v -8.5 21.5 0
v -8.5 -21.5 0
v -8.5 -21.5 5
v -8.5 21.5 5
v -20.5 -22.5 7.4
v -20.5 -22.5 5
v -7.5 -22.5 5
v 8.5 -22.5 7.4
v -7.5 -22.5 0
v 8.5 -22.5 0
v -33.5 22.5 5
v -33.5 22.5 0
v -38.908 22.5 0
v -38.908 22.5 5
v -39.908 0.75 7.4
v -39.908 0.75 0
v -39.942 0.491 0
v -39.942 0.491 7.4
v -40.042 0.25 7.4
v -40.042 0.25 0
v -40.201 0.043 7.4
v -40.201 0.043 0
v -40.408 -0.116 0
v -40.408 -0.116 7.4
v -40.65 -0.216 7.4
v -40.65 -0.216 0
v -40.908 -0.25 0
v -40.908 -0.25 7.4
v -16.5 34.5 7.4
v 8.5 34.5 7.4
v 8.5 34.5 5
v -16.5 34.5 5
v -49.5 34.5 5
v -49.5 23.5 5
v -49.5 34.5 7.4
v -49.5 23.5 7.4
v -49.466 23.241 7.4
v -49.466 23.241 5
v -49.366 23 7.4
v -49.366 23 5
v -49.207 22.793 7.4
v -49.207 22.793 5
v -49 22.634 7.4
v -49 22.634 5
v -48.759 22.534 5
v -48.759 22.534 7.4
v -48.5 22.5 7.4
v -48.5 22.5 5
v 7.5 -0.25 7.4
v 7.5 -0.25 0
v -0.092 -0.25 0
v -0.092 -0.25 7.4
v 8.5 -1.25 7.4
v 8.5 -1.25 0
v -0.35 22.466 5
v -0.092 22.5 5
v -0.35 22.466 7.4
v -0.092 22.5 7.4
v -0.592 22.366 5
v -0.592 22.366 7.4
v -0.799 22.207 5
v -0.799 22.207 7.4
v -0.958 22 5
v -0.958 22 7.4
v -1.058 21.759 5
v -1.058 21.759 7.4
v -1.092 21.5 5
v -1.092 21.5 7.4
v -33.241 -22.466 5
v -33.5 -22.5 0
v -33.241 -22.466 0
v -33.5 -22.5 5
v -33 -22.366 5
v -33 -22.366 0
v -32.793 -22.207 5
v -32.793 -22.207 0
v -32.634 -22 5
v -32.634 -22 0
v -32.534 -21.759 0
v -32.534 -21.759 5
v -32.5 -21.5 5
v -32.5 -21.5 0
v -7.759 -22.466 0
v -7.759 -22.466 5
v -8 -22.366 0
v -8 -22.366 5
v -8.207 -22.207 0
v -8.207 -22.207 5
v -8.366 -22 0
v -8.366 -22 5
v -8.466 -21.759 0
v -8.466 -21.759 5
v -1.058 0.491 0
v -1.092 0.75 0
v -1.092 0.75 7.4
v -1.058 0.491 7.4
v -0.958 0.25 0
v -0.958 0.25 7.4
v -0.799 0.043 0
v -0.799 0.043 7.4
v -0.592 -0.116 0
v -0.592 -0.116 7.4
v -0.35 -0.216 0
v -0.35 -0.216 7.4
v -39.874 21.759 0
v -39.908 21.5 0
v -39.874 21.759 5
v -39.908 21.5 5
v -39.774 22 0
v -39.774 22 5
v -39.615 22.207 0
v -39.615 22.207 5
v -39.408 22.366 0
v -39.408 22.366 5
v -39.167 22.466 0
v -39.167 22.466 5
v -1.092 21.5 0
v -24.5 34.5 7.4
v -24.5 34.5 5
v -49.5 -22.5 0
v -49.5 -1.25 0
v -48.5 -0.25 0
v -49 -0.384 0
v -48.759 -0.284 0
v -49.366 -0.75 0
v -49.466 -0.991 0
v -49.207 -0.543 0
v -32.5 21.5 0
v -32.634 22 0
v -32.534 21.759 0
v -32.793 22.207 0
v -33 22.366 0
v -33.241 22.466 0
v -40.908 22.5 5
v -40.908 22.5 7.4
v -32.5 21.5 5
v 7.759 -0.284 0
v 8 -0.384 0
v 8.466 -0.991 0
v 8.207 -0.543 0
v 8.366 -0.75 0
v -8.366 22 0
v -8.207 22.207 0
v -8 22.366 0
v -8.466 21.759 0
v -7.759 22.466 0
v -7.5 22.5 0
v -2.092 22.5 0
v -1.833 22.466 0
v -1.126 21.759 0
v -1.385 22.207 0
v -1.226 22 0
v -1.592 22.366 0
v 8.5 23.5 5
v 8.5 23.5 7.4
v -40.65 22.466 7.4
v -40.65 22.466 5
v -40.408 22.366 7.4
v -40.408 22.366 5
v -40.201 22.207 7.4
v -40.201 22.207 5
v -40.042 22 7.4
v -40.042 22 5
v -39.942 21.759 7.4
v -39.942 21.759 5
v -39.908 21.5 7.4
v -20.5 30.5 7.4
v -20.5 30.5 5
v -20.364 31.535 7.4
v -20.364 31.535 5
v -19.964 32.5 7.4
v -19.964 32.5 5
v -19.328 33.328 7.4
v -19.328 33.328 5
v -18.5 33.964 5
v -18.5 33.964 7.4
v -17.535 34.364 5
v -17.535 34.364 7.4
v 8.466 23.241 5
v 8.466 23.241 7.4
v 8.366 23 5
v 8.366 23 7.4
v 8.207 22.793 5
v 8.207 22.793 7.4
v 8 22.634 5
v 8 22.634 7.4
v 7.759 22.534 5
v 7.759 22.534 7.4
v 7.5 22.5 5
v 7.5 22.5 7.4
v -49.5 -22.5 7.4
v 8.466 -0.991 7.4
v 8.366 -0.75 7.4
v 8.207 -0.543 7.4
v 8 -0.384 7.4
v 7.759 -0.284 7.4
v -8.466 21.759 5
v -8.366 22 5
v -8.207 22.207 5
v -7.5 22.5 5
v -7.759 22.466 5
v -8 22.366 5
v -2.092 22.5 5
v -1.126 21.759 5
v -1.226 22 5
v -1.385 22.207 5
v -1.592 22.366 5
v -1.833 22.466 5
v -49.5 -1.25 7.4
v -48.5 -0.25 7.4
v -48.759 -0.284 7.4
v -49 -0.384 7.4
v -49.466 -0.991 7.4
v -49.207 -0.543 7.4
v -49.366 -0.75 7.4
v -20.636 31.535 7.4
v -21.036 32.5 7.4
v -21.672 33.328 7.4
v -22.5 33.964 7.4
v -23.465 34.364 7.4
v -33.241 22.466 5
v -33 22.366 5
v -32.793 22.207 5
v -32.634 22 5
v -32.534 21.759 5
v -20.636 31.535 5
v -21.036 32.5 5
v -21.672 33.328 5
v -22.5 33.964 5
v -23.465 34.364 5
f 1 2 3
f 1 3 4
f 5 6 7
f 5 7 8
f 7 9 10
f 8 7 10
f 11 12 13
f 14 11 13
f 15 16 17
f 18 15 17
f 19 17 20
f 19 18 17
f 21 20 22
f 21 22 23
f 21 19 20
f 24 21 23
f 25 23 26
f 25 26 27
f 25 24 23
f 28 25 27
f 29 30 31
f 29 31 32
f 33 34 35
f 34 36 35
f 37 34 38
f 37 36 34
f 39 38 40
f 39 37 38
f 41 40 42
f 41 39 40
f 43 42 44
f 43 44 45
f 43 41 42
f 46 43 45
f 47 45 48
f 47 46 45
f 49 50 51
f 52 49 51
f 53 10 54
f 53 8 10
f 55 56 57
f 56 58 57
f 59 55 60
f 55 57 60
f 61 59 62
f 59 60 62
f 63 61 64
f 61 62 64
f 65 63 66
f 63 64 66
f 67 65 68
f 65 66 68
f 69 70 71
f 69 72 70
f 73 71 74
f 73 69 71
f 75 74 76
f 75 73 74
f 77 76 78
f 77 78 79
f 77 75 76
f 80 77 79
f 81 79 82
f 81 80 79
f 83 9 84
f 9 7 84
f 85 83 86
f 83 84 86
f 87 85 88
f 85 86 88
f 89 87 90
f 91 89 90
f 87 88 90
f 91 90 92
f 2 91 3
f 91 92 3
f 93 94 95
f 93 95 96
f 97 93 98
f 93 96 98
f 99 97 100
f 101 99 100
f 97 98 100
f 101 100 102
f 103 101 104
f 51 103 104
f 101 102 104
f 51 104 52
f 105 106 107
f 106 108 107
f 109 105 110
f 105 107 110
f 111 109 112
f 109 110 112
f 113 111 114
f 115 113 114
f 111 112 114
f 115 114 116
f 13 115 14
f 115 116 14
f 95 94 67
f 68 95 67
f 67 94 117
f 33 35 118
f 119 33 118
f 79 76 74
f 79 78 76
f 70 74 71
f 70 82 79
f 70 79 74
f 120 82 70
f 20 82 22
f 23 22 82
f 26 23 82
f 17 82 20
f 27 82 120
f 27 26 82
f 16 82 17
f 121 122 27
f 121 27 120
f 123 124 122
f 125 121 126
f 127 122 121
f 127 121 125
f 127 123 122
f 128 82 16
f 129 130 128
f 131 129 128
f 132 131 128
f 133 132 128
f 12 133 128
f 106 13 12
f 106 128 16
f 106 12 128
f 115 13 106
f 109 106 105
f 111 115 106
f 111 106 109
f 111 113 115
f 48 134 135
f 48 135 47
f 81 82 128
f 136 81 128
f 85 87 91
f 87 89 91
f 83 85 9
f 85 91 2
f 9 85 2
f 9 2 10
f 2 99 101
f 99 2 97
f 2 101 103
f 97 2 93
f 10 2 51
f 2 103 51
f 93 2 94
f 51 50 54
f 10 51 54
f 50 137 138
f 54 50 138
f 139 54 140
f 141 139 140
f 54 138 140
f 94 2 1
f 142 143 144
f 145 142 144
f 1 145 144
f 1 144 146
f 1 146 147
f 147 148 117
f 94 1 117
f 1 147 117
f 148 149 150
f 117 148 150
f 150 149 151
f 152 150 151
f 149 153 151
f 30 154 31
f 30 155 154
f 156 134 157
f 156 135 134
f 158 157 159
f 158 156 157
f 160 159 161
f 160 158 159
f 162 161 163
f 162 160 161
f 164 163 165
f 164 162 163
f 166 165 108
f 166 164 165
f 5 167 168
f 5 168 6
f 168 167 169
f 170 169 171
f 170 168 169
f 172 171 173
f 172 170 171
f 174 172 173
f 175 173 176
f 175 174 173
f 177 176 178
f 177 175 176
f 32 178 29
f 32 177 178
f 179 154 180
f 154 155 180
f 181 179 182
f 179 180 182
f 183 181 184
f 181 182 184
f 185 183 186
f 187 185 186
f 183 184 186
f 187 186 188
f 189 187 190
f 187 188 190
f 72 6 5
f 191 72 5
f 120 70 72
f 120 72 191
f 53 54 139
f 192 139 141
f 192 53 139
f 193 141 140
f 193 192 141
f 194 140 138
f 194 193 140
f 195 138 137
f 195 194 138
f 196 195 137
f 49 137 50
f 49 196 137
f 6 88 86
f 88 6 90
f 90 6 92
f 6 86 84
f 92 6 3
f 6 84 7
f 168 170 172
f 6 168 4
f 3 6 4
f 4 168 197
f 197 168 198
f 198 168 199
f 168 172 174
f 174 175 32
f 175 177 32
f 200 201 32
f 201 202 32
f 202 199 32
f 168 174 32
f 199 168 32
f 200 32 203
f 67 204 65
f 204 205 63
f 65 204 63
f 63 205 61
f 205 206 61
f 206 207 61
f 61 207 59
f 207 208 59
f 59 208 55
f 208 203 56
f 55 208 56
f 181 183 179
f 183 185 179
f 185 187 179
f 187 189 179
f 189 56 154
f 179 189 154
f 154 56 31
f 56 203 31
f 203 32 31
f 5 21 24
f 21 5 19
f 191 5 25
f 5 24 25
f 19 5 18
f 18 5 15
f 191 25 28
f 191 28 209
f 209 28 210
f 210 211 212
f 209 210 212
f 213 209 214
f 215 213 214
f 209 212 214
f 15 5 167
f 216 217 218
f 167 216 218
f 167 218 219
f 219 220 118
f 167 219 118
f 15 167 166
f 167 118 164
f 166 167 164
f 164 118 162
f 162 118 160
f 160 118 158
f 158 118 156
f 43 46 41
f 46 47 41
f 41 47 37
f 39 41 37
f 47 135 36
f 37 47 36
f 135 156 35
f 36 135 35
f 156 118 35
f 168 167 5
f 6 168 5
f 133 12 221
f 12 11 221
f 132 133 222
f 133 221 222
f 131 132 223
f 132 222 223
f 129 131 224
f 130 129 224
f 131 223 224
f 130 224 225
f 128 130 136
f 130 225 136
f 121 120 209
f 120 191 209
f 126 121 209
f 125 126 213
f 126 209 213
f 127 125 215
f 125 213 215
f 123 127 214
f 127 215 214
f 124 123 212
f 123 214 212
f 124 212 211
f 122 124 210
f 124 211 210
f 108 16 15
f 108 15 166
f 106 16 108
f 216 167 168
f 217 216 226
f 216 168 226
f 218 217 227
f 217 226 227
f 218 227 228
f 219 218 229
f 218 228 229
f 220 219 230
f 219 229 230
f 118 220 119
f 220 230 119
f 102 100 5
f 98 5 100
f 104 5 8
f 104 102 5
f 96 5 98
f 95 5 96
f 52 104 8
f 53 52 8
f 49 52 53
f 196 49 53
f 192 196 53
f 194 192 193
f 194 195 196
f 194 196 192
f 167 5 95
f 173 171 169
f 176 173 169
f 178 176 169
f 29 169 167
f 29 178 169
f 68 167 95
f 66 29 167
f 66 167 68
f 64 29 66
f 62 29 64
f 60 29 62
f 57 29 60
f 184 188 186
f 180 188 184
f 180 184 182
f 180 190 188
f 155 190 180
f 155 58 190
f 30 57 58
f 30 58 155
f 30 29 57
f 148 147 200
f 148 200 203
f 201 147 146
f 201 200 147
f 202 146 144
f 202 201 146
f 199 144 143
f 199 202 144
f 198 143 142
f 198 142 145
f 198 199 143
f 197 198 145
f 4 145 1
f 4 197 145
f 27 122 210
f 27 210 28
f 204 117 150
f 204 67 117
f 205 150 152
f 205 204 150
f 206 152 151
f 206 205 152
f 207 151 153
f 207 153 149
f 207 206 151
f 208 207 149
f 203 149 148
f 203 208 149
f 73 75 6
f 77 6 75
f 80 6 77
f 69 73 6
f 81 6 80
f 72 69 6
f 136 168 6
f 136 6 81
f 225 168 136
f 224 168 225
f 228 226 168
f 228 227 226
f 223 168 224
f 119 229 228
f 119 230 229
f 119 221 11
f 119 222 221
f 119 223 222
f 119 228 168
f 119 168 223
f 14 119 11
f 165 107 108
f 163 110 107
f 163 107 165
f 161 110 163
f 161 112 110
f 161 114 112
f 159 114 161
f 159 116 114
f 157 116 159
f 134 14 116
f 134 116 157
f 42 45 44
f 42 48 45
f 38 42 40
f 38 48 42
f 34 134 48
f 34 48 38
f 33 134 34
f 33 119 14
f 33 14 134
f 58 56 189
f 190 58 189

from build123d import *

# Parameters (mm, degrees)
SKETCH1_W           = 17
SKETCH1_H           = 45
BOSS_EXTRUDE1_DEPTH = 12
BOSS_EXTRUDE2_DEPTH = 7
FILLET1_R           = 4
CUT_EXTRUDE1_DEPTH  = 42.886752082
CUT_EXTRUDE2_START  = -4.6
CUT_EXTRUDE2_DEPTH  = 4.6
FILLET2_R           = 1
FILLET3_R           = 1


with BuildPart() as part:
    # Sketch1 → Boss-Extrude1 (new body)
    with BuildSketch(Plane.XY):
        Rectangle(SKETCH1_W, SKETCH1_H)
    extrude(amount=BOSS_EXTRUDE1_DEPTH)

    # Sketch2 → Boss-Extrude2 (add)
    with BuildSketch(Plane.XY.offset(12)):
        Polygon((-8.5, -22.5), (-8.5, 22.5), (8.5, 22.5), (8.5, 34.5), (-20.5, 34.5), (-20.5, -22.5), align=None)
    extrude(amount=-BOSS_EXTRUDE2_DEPTH)

    # Fillet1
    fillet1_edges = [part.edges().sort_by_distance(p)[0] for p in [
        (-20.5, 34.5, 8.5),
    ]]
    fillet(fillet1_edges, radius=FILLET1_R)

    # Sketch3 → Cut-Extrude1 (cut, through all)
    with BuildSketch(Plane(origin=(0, 0, 0), x_dir=(-1, 0, 0), z_dir=(0, 0, -1))):
        Polygon((-2.5, -0.25), (1.091673087, -0.25), (1.091673087, 22.5), (-8.5, 22.5), (-8.5, -0.25), (-3.5, -0.25), align=None)
    extrude(amount=-CUT_EXTRUDE1_DEPTH, mode=Mode.SUBTRACT)

    # Sketch4 → Cut-Extrude2 (cut)
    with BuildSketch(Plane.XY.offset(12).offset(CUT_EXTRUDE2_START)):
        with BuildLine():
            Line((-1.091673087, -0.25), (-1.091673087, 22.5))
            Line((-1.091673087, 22.5), (8.5, 22.5))
            Line((8.5, 22.5), (8.5, 34.5))
            Line((8.5, 34.5), (-16.5, 34.5))
            ThreePointArc((-16.5, 34.5), (-19.328427125, 33.328427125), (-20.5, 30.5))
            Line((-20.5, 30.5), (-20.5, -22.5))
            Line((-20.5, -22.5), (8.5, -22.5))
            Line((8.5, -22.5), (8.5, -0.25))
            Line((8.5, -0.25), (-1.091673087, -0.25))
        make_face()
    extrude(amount=CUT_EXTRUDE2_DEPTH, mode=Mode.SUBTRACT)

    # Fillet2
    fillet2_edges = [part.edges().sort_by_distance(p)[0] for p in [
        (-1.091673087, -0.25, 3.7),
        (8.5, -0.25, 3.7),
        (-1.091673087, 22.5, 6.2),
        (8.5, 22.5, 6.2),
    ]]
    fillet(fillet2_edges, radius=FILLET2_R)

    # Fillet3
    fillet3_edges = [part.edges().sort_by_distance(p)[0] for p in [
        (-8.5, -22.5, 2.5),
        (-1.091673087, 22.5, 2.5),
        (-8.5, 22.5, 2.5),
    ]]
    fillet(fillet3_edges, radius=FILLET3_R)


with BuildPart() as body_2:
    # Mirror1: mirrored copy
    add(part.part.mirror(Plane(origin=(-20.5, 34.5, 5), x_dir=(0, 0, 1), z_dir=(-1, 0, 0))))


solid = Compound([part.part, body_2.part])
